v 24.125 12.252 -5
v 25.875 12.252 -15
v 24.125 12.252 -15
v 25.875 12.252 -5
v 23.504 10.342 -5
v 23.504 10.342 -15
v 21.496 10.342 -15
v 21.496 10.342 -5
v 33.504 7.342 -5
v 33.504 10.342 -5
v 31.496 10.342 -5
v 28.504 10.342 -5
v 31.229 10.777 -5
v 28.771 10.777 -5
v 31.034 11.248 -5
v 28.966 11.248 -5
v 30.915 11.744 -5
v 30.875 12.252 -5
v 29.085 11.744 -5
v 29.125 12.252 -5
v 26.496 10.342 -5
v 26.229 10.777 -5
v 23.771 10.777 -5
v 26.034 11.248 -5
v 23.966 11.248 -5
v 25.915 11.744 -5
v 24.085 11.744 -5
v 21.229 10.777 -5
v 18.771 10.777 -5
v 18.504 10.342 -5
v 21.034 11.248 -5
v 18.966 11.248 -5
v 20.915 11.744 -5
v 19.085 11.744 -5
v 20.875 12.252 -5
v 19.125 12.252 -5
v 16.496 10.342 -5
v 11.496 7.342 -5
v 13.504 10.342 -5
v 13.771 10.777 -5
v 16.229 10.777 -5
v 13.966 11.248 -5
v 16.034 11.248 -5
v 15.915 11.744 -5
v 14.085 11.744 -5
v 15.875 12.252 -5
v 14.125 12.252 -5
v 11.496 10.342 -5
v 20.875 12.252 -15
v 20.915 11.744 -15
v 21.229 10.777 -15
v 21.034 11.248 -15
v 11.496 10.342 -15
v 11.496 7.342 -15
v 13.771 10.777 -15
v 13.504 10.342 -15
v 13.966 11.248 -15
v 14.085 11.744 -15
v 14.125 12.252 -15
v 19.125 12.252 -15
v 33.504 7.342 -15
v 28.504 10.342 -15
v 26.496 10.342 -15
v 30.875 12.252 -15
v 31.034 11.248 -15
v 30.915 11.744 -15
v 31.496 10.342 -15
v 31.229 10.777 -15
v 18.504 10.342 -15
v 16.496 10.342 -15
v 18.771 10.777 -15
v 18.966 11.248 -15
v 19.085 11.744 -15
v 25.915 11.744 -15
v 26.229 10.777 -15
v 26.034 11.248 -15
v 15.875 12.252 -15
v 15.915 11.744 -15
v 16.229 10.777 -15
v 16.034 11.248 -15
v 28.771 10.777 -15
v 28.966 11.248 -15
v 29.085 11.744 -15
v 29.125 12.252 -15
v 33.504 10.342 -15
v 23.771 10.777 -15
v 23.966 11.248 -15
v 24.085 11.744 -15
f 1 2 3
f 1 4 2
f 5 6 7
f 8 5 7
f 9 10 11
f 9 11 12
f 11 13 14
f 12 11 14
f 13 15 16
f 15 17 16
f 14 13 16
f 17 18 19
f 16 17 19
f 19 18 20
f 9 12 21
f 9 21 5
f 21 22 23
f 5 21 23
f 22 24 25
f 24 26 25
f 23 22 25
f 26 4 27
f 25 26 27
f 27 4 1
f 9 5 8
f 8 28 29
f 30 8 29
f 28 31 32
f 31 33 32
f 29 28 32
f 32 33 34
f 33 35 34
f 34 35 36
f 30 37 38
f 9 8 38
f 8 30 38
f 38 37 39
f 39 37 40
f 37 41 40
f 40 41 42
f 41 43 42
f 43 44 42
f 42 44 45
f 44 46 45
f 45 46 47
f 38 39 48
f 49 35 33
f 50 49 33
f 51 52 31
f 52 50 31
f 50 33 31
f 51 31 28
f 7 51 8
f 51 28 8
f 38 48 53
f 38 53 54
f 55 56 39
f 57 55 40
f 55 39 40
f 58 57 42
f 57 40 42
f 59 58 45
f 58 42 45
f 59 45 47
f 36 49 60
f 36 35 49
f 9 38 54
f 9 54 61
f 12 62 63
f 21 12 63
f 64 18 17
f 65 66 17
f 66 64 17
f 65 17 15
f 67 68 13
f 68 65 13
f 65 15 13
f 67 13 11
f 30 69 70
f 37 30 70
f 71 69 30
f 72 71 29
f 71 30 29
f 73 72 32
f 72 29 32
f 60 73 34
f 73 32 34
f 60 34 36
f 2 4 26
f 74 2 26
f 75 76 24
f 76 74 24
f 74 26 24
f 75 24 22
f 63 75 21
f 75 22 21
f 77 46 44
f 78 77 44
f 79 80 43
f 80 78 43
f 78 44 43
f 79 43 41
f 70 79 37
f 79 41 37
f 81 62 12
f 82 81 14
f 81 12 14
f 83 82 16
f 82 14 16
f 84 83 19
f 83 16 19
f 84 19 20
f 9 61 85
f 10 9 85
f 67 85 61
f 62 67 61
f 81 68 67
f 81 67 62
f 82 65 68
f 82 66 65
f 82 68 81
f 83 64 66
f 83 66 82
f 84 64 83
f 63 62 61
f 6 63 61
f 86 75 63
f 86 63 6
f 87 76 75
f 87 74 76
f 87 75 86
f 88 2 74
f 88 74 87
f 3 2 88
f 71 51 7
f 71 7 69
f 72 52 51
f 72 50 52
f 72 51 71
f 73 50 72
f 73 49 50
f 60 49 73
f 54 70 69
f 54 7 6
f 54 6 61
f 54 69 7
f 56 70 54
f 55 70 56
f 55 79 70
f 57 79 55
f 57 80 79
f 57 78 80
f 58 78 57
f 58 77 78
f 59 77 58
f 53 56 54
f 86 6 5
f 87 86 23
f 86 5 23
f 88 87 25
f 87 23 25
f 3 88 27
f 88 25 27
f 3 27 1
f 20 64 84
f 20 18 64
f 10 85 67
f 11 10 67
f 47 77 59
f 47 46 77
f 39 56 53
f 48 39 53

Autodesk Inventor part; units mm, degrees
sketch "Sketch_1" plane through (0, 0, 0) normal (0, 0, 1) x (1, 0, 0)
  line L0 (10, 12.2524) -> (10.875, 12.2524)
  arc A0 (10.875, 12.2524) -> (11.4955, 10.3424) centre (14.125, 12.2524) ccw
  line L1 (11.4955, 10.3424) -> (13.5045, 10.3424)
  arc A1 (13.5045, 10.3424) -> (14.125, 12.2524) centre (10.875, 12.2524) ccw
  line L2 (14.125, 12.2524) -> (15.875, 12.2524)
  arc A2 (15.875, 12.2524) -> (16.4955, 10.3424) centre (19.125, 12.2524) ccw
  line L3 (16.4955, 10.3424) -> (18.5045, 10.3424)
  arc A3 (18.5045, 10.3424) -> (19.125, 12.2524) centre (15.875, 12.2524) ccw
  line L4 (19.125, 12.2524) -> (20.875, 12.2524)
  arc A4 (20.875, 12.2524) -> (21.4955, 10.3424) centre (24.125, 12.2524) ccw
  line L5 (21.4955, 10.3424) -> (23.5045, 10.3424)
  arc A5 (23.5045, 10.3424) -> (24.125, 12.2524) centre (20.875, 12.2524) ccw
  line L6 (24.125, 12.2524) -> (25.875, 12.2524)
  arc A6 (25.875, 12.2524) -> (26.4955, 10.3424) centre (29.125, 12.2524) ccw
  line L7 (26.4955, 10.3424) -> (28.5045, 10.3424)
  arc A7 (28.5045, 10.3424) -> (29.125, 12.2524) centre (25.875, 12.2524) ccw
  line L8 (29.125, 12.2524) -> (30.875, 12.2524)
  arc A8 (30.875, 12.2524) -> (31.4955, 10.3424) centre (34.125, 12.2524) ccw
  line L9 (31.4955, 10.3424) -> (33.5045, 10.3424)
  arc A9 (33.5045, 10.3424) -> (34.125, 12.2524) centre (30.875, 12.2524) ccw
  line L10 (34.125, 12.2524) -> (35, 12.2524)
  line L11 (35, 12.2524) -> (35, 13.7524)
  line L12 (35, 13.7524) -> (10, 13.7524)
  line L13 (10, 13.7524) -> (10, 12.2524)
extrude "Extrusion1" add sketch "Sketch_1" along normal mid plane 10
sketch "Sketch_2" plane through (0, 0, 0) normal (0, 0, 1) x (1, 0, 0)
  arc A0 (0, 13.7524) -> (0, -13.7524) centre (0, 0) ccw
  line L0 (0, -13.7524) -> (260, -13.7524)
  arc A1 (260, -13.7524) -> (260, 13.7524) centre (260, 0) ccw
  line L1 (260, 13.7524) -> (0, 13.7524)
  arc A2 (0, 12.2524) -> (0, -12.2524) centre (0, 0) ccw
  line L2 (0, -12.2524) -> (260, -12.2524)
  arc A3 (260, -12.2524) -> (260, 12.2524) centre (260, 0) ccw
  line L3 (260, 12.2524) -> (0, 12.2524)
extrude "Extrusion2" add sketch "Sketch_2" along normal mid plane 10
ref_plane "C1_XY" through (0, 0, 0) normal (0, 0, 1) x (1, 0, 0)
ref_plane "C1_YZ" through (0, 0, 0) normal (1, 0, 0) x (0, 1, 0)
ref_plane "C1_ZX" through (0, 0, 0) normal (0, 1, 0) x (0, 0, 1)
sketch "スケッチ3" plane through (0, 0, -5) normal (0, 0, -1) x (-1, 0, 0)
  line L0 (-33.5045, 12.2524) -> (-11.4955, 12.2524)
  line L1 (-11.4955, 12.2524) -> (-11.4955, 7.3424)
  line L2 (-11.4955, 7.3424) -> (-33.5045, 7.3424)
  line L3 (-33.5045, 7.3424) -> (-33.5045, 12.2524)
  line L4 (-33.5045, 10.3424) -> (-31.4955, 10.3424) projected
  line L5 (-30.71, 12.2524) -> (-29.125, 12.2524) projected
  arc A0 (-29.125, 12.2524) -> (-28.5045, 10.3424) centre (-25.875, 12.2524) ccw projected
  line L6 (-28.5045, 10.3424) -> (-26.4955, 10.3424) projected
  arc A1 (-26.4955, 10.3424) -> (-25.875, 12.2524) centre (-29.125, 12.2524) ccw projected
  line L7 (-25.875, 12.2524) -> (-24.125, 12.2524) projected
  arc A2 (-24.125, 12.2524) -> (-23.5045, 10.3424) centre (-20.875, 12.2524) ccw projected
  line L8 (-23.5045, 10.3424) -> (-21.4955, 10.3424) projected
  arc A3 (-21.4955, 10.3424) -> (-20.875, 12.2524) centre (-24.125, 12.2524) ccw projected
  line L9 (-20.875, 12.2524) -> (-19.125, 12.2524) projected
  arc A4 (-19.125, 12.2524) -> (-18.5045, 10.3424) centre (-15.875, 12.2524) ccw projected
  line L10 (-18.5045, 10.3424) -> (-16.4955, 10.3424) projected
  arc A5 (-16.4955, 10.3424) -> (-15.875, 12.2524) centre (-19.125, 12.2524) ccw projected
  line L11 (-15.875, 12.2524) -> (-14.125, 12.2524) projected
  line L12 (-13.5045, 10.3424) -> (-11.4955, 10.3424) projected
  arc A6 (-31.4955, 10.3424) -> (-30.875, 12.2524) centre (-34.125, 12.2524) ccw projected
  arc A7 (-34.125, 12.2524) -> (-33.5045, 10.3424) centre (-30.875, 12.2524) ccw projected
  arc A8 (-14.125, 12.2524) -> (-13.5045, 10.3424) centre (-10.875, 12.2524) ccw projected
  arc A9 (-11.4955, 10.3424) -> (-10.875, 12.2524) centre (-14.125, 12.2524) ccw projected
  point P0 (0, 0)
  point P1 (-30.71, 12.2472)
  point P2 (-15.875, 12.2524)
  point P3 (-20.875, 12.2524)
  point P4 (-25.875, 12.2524)
  point P5 (-30.875, 12.2524)
  dimension "d4" = 3
extrude "押し出し3" add sketch "スケッチ3" along normal blind 10 contours L0 A0 L6 A1 A2 L8 A3 A4 L10 A5 A8 L12 L1 L2 L3 L4 A6
sketch "スケッチ4" plane through (0, 13.7524, 5) normal (0, 1, 0) x (1, 0, 0)
  line L0 (-13.7524, 0) -> (0, 0) projected
  line L1 (273.7524, 10) -> (260, 10) projected
  line L2 (-13.7524, 0) -> (273.7524, 0)
  line L3 (273.7524, 0) -> (273.7524, 10)
  line L4 (273.7524, 10) -> (-13.7524, 10)
  line L5 (-13.7524, 10) -> (-13.7524, 0)
  point P0 (0, 5)
extrude "押し出し4" cut sketch "スケッチ4" against normal through all
properties part number "HTBN600S5M-100_info-1-16-16" material "ABS プラスチック"
